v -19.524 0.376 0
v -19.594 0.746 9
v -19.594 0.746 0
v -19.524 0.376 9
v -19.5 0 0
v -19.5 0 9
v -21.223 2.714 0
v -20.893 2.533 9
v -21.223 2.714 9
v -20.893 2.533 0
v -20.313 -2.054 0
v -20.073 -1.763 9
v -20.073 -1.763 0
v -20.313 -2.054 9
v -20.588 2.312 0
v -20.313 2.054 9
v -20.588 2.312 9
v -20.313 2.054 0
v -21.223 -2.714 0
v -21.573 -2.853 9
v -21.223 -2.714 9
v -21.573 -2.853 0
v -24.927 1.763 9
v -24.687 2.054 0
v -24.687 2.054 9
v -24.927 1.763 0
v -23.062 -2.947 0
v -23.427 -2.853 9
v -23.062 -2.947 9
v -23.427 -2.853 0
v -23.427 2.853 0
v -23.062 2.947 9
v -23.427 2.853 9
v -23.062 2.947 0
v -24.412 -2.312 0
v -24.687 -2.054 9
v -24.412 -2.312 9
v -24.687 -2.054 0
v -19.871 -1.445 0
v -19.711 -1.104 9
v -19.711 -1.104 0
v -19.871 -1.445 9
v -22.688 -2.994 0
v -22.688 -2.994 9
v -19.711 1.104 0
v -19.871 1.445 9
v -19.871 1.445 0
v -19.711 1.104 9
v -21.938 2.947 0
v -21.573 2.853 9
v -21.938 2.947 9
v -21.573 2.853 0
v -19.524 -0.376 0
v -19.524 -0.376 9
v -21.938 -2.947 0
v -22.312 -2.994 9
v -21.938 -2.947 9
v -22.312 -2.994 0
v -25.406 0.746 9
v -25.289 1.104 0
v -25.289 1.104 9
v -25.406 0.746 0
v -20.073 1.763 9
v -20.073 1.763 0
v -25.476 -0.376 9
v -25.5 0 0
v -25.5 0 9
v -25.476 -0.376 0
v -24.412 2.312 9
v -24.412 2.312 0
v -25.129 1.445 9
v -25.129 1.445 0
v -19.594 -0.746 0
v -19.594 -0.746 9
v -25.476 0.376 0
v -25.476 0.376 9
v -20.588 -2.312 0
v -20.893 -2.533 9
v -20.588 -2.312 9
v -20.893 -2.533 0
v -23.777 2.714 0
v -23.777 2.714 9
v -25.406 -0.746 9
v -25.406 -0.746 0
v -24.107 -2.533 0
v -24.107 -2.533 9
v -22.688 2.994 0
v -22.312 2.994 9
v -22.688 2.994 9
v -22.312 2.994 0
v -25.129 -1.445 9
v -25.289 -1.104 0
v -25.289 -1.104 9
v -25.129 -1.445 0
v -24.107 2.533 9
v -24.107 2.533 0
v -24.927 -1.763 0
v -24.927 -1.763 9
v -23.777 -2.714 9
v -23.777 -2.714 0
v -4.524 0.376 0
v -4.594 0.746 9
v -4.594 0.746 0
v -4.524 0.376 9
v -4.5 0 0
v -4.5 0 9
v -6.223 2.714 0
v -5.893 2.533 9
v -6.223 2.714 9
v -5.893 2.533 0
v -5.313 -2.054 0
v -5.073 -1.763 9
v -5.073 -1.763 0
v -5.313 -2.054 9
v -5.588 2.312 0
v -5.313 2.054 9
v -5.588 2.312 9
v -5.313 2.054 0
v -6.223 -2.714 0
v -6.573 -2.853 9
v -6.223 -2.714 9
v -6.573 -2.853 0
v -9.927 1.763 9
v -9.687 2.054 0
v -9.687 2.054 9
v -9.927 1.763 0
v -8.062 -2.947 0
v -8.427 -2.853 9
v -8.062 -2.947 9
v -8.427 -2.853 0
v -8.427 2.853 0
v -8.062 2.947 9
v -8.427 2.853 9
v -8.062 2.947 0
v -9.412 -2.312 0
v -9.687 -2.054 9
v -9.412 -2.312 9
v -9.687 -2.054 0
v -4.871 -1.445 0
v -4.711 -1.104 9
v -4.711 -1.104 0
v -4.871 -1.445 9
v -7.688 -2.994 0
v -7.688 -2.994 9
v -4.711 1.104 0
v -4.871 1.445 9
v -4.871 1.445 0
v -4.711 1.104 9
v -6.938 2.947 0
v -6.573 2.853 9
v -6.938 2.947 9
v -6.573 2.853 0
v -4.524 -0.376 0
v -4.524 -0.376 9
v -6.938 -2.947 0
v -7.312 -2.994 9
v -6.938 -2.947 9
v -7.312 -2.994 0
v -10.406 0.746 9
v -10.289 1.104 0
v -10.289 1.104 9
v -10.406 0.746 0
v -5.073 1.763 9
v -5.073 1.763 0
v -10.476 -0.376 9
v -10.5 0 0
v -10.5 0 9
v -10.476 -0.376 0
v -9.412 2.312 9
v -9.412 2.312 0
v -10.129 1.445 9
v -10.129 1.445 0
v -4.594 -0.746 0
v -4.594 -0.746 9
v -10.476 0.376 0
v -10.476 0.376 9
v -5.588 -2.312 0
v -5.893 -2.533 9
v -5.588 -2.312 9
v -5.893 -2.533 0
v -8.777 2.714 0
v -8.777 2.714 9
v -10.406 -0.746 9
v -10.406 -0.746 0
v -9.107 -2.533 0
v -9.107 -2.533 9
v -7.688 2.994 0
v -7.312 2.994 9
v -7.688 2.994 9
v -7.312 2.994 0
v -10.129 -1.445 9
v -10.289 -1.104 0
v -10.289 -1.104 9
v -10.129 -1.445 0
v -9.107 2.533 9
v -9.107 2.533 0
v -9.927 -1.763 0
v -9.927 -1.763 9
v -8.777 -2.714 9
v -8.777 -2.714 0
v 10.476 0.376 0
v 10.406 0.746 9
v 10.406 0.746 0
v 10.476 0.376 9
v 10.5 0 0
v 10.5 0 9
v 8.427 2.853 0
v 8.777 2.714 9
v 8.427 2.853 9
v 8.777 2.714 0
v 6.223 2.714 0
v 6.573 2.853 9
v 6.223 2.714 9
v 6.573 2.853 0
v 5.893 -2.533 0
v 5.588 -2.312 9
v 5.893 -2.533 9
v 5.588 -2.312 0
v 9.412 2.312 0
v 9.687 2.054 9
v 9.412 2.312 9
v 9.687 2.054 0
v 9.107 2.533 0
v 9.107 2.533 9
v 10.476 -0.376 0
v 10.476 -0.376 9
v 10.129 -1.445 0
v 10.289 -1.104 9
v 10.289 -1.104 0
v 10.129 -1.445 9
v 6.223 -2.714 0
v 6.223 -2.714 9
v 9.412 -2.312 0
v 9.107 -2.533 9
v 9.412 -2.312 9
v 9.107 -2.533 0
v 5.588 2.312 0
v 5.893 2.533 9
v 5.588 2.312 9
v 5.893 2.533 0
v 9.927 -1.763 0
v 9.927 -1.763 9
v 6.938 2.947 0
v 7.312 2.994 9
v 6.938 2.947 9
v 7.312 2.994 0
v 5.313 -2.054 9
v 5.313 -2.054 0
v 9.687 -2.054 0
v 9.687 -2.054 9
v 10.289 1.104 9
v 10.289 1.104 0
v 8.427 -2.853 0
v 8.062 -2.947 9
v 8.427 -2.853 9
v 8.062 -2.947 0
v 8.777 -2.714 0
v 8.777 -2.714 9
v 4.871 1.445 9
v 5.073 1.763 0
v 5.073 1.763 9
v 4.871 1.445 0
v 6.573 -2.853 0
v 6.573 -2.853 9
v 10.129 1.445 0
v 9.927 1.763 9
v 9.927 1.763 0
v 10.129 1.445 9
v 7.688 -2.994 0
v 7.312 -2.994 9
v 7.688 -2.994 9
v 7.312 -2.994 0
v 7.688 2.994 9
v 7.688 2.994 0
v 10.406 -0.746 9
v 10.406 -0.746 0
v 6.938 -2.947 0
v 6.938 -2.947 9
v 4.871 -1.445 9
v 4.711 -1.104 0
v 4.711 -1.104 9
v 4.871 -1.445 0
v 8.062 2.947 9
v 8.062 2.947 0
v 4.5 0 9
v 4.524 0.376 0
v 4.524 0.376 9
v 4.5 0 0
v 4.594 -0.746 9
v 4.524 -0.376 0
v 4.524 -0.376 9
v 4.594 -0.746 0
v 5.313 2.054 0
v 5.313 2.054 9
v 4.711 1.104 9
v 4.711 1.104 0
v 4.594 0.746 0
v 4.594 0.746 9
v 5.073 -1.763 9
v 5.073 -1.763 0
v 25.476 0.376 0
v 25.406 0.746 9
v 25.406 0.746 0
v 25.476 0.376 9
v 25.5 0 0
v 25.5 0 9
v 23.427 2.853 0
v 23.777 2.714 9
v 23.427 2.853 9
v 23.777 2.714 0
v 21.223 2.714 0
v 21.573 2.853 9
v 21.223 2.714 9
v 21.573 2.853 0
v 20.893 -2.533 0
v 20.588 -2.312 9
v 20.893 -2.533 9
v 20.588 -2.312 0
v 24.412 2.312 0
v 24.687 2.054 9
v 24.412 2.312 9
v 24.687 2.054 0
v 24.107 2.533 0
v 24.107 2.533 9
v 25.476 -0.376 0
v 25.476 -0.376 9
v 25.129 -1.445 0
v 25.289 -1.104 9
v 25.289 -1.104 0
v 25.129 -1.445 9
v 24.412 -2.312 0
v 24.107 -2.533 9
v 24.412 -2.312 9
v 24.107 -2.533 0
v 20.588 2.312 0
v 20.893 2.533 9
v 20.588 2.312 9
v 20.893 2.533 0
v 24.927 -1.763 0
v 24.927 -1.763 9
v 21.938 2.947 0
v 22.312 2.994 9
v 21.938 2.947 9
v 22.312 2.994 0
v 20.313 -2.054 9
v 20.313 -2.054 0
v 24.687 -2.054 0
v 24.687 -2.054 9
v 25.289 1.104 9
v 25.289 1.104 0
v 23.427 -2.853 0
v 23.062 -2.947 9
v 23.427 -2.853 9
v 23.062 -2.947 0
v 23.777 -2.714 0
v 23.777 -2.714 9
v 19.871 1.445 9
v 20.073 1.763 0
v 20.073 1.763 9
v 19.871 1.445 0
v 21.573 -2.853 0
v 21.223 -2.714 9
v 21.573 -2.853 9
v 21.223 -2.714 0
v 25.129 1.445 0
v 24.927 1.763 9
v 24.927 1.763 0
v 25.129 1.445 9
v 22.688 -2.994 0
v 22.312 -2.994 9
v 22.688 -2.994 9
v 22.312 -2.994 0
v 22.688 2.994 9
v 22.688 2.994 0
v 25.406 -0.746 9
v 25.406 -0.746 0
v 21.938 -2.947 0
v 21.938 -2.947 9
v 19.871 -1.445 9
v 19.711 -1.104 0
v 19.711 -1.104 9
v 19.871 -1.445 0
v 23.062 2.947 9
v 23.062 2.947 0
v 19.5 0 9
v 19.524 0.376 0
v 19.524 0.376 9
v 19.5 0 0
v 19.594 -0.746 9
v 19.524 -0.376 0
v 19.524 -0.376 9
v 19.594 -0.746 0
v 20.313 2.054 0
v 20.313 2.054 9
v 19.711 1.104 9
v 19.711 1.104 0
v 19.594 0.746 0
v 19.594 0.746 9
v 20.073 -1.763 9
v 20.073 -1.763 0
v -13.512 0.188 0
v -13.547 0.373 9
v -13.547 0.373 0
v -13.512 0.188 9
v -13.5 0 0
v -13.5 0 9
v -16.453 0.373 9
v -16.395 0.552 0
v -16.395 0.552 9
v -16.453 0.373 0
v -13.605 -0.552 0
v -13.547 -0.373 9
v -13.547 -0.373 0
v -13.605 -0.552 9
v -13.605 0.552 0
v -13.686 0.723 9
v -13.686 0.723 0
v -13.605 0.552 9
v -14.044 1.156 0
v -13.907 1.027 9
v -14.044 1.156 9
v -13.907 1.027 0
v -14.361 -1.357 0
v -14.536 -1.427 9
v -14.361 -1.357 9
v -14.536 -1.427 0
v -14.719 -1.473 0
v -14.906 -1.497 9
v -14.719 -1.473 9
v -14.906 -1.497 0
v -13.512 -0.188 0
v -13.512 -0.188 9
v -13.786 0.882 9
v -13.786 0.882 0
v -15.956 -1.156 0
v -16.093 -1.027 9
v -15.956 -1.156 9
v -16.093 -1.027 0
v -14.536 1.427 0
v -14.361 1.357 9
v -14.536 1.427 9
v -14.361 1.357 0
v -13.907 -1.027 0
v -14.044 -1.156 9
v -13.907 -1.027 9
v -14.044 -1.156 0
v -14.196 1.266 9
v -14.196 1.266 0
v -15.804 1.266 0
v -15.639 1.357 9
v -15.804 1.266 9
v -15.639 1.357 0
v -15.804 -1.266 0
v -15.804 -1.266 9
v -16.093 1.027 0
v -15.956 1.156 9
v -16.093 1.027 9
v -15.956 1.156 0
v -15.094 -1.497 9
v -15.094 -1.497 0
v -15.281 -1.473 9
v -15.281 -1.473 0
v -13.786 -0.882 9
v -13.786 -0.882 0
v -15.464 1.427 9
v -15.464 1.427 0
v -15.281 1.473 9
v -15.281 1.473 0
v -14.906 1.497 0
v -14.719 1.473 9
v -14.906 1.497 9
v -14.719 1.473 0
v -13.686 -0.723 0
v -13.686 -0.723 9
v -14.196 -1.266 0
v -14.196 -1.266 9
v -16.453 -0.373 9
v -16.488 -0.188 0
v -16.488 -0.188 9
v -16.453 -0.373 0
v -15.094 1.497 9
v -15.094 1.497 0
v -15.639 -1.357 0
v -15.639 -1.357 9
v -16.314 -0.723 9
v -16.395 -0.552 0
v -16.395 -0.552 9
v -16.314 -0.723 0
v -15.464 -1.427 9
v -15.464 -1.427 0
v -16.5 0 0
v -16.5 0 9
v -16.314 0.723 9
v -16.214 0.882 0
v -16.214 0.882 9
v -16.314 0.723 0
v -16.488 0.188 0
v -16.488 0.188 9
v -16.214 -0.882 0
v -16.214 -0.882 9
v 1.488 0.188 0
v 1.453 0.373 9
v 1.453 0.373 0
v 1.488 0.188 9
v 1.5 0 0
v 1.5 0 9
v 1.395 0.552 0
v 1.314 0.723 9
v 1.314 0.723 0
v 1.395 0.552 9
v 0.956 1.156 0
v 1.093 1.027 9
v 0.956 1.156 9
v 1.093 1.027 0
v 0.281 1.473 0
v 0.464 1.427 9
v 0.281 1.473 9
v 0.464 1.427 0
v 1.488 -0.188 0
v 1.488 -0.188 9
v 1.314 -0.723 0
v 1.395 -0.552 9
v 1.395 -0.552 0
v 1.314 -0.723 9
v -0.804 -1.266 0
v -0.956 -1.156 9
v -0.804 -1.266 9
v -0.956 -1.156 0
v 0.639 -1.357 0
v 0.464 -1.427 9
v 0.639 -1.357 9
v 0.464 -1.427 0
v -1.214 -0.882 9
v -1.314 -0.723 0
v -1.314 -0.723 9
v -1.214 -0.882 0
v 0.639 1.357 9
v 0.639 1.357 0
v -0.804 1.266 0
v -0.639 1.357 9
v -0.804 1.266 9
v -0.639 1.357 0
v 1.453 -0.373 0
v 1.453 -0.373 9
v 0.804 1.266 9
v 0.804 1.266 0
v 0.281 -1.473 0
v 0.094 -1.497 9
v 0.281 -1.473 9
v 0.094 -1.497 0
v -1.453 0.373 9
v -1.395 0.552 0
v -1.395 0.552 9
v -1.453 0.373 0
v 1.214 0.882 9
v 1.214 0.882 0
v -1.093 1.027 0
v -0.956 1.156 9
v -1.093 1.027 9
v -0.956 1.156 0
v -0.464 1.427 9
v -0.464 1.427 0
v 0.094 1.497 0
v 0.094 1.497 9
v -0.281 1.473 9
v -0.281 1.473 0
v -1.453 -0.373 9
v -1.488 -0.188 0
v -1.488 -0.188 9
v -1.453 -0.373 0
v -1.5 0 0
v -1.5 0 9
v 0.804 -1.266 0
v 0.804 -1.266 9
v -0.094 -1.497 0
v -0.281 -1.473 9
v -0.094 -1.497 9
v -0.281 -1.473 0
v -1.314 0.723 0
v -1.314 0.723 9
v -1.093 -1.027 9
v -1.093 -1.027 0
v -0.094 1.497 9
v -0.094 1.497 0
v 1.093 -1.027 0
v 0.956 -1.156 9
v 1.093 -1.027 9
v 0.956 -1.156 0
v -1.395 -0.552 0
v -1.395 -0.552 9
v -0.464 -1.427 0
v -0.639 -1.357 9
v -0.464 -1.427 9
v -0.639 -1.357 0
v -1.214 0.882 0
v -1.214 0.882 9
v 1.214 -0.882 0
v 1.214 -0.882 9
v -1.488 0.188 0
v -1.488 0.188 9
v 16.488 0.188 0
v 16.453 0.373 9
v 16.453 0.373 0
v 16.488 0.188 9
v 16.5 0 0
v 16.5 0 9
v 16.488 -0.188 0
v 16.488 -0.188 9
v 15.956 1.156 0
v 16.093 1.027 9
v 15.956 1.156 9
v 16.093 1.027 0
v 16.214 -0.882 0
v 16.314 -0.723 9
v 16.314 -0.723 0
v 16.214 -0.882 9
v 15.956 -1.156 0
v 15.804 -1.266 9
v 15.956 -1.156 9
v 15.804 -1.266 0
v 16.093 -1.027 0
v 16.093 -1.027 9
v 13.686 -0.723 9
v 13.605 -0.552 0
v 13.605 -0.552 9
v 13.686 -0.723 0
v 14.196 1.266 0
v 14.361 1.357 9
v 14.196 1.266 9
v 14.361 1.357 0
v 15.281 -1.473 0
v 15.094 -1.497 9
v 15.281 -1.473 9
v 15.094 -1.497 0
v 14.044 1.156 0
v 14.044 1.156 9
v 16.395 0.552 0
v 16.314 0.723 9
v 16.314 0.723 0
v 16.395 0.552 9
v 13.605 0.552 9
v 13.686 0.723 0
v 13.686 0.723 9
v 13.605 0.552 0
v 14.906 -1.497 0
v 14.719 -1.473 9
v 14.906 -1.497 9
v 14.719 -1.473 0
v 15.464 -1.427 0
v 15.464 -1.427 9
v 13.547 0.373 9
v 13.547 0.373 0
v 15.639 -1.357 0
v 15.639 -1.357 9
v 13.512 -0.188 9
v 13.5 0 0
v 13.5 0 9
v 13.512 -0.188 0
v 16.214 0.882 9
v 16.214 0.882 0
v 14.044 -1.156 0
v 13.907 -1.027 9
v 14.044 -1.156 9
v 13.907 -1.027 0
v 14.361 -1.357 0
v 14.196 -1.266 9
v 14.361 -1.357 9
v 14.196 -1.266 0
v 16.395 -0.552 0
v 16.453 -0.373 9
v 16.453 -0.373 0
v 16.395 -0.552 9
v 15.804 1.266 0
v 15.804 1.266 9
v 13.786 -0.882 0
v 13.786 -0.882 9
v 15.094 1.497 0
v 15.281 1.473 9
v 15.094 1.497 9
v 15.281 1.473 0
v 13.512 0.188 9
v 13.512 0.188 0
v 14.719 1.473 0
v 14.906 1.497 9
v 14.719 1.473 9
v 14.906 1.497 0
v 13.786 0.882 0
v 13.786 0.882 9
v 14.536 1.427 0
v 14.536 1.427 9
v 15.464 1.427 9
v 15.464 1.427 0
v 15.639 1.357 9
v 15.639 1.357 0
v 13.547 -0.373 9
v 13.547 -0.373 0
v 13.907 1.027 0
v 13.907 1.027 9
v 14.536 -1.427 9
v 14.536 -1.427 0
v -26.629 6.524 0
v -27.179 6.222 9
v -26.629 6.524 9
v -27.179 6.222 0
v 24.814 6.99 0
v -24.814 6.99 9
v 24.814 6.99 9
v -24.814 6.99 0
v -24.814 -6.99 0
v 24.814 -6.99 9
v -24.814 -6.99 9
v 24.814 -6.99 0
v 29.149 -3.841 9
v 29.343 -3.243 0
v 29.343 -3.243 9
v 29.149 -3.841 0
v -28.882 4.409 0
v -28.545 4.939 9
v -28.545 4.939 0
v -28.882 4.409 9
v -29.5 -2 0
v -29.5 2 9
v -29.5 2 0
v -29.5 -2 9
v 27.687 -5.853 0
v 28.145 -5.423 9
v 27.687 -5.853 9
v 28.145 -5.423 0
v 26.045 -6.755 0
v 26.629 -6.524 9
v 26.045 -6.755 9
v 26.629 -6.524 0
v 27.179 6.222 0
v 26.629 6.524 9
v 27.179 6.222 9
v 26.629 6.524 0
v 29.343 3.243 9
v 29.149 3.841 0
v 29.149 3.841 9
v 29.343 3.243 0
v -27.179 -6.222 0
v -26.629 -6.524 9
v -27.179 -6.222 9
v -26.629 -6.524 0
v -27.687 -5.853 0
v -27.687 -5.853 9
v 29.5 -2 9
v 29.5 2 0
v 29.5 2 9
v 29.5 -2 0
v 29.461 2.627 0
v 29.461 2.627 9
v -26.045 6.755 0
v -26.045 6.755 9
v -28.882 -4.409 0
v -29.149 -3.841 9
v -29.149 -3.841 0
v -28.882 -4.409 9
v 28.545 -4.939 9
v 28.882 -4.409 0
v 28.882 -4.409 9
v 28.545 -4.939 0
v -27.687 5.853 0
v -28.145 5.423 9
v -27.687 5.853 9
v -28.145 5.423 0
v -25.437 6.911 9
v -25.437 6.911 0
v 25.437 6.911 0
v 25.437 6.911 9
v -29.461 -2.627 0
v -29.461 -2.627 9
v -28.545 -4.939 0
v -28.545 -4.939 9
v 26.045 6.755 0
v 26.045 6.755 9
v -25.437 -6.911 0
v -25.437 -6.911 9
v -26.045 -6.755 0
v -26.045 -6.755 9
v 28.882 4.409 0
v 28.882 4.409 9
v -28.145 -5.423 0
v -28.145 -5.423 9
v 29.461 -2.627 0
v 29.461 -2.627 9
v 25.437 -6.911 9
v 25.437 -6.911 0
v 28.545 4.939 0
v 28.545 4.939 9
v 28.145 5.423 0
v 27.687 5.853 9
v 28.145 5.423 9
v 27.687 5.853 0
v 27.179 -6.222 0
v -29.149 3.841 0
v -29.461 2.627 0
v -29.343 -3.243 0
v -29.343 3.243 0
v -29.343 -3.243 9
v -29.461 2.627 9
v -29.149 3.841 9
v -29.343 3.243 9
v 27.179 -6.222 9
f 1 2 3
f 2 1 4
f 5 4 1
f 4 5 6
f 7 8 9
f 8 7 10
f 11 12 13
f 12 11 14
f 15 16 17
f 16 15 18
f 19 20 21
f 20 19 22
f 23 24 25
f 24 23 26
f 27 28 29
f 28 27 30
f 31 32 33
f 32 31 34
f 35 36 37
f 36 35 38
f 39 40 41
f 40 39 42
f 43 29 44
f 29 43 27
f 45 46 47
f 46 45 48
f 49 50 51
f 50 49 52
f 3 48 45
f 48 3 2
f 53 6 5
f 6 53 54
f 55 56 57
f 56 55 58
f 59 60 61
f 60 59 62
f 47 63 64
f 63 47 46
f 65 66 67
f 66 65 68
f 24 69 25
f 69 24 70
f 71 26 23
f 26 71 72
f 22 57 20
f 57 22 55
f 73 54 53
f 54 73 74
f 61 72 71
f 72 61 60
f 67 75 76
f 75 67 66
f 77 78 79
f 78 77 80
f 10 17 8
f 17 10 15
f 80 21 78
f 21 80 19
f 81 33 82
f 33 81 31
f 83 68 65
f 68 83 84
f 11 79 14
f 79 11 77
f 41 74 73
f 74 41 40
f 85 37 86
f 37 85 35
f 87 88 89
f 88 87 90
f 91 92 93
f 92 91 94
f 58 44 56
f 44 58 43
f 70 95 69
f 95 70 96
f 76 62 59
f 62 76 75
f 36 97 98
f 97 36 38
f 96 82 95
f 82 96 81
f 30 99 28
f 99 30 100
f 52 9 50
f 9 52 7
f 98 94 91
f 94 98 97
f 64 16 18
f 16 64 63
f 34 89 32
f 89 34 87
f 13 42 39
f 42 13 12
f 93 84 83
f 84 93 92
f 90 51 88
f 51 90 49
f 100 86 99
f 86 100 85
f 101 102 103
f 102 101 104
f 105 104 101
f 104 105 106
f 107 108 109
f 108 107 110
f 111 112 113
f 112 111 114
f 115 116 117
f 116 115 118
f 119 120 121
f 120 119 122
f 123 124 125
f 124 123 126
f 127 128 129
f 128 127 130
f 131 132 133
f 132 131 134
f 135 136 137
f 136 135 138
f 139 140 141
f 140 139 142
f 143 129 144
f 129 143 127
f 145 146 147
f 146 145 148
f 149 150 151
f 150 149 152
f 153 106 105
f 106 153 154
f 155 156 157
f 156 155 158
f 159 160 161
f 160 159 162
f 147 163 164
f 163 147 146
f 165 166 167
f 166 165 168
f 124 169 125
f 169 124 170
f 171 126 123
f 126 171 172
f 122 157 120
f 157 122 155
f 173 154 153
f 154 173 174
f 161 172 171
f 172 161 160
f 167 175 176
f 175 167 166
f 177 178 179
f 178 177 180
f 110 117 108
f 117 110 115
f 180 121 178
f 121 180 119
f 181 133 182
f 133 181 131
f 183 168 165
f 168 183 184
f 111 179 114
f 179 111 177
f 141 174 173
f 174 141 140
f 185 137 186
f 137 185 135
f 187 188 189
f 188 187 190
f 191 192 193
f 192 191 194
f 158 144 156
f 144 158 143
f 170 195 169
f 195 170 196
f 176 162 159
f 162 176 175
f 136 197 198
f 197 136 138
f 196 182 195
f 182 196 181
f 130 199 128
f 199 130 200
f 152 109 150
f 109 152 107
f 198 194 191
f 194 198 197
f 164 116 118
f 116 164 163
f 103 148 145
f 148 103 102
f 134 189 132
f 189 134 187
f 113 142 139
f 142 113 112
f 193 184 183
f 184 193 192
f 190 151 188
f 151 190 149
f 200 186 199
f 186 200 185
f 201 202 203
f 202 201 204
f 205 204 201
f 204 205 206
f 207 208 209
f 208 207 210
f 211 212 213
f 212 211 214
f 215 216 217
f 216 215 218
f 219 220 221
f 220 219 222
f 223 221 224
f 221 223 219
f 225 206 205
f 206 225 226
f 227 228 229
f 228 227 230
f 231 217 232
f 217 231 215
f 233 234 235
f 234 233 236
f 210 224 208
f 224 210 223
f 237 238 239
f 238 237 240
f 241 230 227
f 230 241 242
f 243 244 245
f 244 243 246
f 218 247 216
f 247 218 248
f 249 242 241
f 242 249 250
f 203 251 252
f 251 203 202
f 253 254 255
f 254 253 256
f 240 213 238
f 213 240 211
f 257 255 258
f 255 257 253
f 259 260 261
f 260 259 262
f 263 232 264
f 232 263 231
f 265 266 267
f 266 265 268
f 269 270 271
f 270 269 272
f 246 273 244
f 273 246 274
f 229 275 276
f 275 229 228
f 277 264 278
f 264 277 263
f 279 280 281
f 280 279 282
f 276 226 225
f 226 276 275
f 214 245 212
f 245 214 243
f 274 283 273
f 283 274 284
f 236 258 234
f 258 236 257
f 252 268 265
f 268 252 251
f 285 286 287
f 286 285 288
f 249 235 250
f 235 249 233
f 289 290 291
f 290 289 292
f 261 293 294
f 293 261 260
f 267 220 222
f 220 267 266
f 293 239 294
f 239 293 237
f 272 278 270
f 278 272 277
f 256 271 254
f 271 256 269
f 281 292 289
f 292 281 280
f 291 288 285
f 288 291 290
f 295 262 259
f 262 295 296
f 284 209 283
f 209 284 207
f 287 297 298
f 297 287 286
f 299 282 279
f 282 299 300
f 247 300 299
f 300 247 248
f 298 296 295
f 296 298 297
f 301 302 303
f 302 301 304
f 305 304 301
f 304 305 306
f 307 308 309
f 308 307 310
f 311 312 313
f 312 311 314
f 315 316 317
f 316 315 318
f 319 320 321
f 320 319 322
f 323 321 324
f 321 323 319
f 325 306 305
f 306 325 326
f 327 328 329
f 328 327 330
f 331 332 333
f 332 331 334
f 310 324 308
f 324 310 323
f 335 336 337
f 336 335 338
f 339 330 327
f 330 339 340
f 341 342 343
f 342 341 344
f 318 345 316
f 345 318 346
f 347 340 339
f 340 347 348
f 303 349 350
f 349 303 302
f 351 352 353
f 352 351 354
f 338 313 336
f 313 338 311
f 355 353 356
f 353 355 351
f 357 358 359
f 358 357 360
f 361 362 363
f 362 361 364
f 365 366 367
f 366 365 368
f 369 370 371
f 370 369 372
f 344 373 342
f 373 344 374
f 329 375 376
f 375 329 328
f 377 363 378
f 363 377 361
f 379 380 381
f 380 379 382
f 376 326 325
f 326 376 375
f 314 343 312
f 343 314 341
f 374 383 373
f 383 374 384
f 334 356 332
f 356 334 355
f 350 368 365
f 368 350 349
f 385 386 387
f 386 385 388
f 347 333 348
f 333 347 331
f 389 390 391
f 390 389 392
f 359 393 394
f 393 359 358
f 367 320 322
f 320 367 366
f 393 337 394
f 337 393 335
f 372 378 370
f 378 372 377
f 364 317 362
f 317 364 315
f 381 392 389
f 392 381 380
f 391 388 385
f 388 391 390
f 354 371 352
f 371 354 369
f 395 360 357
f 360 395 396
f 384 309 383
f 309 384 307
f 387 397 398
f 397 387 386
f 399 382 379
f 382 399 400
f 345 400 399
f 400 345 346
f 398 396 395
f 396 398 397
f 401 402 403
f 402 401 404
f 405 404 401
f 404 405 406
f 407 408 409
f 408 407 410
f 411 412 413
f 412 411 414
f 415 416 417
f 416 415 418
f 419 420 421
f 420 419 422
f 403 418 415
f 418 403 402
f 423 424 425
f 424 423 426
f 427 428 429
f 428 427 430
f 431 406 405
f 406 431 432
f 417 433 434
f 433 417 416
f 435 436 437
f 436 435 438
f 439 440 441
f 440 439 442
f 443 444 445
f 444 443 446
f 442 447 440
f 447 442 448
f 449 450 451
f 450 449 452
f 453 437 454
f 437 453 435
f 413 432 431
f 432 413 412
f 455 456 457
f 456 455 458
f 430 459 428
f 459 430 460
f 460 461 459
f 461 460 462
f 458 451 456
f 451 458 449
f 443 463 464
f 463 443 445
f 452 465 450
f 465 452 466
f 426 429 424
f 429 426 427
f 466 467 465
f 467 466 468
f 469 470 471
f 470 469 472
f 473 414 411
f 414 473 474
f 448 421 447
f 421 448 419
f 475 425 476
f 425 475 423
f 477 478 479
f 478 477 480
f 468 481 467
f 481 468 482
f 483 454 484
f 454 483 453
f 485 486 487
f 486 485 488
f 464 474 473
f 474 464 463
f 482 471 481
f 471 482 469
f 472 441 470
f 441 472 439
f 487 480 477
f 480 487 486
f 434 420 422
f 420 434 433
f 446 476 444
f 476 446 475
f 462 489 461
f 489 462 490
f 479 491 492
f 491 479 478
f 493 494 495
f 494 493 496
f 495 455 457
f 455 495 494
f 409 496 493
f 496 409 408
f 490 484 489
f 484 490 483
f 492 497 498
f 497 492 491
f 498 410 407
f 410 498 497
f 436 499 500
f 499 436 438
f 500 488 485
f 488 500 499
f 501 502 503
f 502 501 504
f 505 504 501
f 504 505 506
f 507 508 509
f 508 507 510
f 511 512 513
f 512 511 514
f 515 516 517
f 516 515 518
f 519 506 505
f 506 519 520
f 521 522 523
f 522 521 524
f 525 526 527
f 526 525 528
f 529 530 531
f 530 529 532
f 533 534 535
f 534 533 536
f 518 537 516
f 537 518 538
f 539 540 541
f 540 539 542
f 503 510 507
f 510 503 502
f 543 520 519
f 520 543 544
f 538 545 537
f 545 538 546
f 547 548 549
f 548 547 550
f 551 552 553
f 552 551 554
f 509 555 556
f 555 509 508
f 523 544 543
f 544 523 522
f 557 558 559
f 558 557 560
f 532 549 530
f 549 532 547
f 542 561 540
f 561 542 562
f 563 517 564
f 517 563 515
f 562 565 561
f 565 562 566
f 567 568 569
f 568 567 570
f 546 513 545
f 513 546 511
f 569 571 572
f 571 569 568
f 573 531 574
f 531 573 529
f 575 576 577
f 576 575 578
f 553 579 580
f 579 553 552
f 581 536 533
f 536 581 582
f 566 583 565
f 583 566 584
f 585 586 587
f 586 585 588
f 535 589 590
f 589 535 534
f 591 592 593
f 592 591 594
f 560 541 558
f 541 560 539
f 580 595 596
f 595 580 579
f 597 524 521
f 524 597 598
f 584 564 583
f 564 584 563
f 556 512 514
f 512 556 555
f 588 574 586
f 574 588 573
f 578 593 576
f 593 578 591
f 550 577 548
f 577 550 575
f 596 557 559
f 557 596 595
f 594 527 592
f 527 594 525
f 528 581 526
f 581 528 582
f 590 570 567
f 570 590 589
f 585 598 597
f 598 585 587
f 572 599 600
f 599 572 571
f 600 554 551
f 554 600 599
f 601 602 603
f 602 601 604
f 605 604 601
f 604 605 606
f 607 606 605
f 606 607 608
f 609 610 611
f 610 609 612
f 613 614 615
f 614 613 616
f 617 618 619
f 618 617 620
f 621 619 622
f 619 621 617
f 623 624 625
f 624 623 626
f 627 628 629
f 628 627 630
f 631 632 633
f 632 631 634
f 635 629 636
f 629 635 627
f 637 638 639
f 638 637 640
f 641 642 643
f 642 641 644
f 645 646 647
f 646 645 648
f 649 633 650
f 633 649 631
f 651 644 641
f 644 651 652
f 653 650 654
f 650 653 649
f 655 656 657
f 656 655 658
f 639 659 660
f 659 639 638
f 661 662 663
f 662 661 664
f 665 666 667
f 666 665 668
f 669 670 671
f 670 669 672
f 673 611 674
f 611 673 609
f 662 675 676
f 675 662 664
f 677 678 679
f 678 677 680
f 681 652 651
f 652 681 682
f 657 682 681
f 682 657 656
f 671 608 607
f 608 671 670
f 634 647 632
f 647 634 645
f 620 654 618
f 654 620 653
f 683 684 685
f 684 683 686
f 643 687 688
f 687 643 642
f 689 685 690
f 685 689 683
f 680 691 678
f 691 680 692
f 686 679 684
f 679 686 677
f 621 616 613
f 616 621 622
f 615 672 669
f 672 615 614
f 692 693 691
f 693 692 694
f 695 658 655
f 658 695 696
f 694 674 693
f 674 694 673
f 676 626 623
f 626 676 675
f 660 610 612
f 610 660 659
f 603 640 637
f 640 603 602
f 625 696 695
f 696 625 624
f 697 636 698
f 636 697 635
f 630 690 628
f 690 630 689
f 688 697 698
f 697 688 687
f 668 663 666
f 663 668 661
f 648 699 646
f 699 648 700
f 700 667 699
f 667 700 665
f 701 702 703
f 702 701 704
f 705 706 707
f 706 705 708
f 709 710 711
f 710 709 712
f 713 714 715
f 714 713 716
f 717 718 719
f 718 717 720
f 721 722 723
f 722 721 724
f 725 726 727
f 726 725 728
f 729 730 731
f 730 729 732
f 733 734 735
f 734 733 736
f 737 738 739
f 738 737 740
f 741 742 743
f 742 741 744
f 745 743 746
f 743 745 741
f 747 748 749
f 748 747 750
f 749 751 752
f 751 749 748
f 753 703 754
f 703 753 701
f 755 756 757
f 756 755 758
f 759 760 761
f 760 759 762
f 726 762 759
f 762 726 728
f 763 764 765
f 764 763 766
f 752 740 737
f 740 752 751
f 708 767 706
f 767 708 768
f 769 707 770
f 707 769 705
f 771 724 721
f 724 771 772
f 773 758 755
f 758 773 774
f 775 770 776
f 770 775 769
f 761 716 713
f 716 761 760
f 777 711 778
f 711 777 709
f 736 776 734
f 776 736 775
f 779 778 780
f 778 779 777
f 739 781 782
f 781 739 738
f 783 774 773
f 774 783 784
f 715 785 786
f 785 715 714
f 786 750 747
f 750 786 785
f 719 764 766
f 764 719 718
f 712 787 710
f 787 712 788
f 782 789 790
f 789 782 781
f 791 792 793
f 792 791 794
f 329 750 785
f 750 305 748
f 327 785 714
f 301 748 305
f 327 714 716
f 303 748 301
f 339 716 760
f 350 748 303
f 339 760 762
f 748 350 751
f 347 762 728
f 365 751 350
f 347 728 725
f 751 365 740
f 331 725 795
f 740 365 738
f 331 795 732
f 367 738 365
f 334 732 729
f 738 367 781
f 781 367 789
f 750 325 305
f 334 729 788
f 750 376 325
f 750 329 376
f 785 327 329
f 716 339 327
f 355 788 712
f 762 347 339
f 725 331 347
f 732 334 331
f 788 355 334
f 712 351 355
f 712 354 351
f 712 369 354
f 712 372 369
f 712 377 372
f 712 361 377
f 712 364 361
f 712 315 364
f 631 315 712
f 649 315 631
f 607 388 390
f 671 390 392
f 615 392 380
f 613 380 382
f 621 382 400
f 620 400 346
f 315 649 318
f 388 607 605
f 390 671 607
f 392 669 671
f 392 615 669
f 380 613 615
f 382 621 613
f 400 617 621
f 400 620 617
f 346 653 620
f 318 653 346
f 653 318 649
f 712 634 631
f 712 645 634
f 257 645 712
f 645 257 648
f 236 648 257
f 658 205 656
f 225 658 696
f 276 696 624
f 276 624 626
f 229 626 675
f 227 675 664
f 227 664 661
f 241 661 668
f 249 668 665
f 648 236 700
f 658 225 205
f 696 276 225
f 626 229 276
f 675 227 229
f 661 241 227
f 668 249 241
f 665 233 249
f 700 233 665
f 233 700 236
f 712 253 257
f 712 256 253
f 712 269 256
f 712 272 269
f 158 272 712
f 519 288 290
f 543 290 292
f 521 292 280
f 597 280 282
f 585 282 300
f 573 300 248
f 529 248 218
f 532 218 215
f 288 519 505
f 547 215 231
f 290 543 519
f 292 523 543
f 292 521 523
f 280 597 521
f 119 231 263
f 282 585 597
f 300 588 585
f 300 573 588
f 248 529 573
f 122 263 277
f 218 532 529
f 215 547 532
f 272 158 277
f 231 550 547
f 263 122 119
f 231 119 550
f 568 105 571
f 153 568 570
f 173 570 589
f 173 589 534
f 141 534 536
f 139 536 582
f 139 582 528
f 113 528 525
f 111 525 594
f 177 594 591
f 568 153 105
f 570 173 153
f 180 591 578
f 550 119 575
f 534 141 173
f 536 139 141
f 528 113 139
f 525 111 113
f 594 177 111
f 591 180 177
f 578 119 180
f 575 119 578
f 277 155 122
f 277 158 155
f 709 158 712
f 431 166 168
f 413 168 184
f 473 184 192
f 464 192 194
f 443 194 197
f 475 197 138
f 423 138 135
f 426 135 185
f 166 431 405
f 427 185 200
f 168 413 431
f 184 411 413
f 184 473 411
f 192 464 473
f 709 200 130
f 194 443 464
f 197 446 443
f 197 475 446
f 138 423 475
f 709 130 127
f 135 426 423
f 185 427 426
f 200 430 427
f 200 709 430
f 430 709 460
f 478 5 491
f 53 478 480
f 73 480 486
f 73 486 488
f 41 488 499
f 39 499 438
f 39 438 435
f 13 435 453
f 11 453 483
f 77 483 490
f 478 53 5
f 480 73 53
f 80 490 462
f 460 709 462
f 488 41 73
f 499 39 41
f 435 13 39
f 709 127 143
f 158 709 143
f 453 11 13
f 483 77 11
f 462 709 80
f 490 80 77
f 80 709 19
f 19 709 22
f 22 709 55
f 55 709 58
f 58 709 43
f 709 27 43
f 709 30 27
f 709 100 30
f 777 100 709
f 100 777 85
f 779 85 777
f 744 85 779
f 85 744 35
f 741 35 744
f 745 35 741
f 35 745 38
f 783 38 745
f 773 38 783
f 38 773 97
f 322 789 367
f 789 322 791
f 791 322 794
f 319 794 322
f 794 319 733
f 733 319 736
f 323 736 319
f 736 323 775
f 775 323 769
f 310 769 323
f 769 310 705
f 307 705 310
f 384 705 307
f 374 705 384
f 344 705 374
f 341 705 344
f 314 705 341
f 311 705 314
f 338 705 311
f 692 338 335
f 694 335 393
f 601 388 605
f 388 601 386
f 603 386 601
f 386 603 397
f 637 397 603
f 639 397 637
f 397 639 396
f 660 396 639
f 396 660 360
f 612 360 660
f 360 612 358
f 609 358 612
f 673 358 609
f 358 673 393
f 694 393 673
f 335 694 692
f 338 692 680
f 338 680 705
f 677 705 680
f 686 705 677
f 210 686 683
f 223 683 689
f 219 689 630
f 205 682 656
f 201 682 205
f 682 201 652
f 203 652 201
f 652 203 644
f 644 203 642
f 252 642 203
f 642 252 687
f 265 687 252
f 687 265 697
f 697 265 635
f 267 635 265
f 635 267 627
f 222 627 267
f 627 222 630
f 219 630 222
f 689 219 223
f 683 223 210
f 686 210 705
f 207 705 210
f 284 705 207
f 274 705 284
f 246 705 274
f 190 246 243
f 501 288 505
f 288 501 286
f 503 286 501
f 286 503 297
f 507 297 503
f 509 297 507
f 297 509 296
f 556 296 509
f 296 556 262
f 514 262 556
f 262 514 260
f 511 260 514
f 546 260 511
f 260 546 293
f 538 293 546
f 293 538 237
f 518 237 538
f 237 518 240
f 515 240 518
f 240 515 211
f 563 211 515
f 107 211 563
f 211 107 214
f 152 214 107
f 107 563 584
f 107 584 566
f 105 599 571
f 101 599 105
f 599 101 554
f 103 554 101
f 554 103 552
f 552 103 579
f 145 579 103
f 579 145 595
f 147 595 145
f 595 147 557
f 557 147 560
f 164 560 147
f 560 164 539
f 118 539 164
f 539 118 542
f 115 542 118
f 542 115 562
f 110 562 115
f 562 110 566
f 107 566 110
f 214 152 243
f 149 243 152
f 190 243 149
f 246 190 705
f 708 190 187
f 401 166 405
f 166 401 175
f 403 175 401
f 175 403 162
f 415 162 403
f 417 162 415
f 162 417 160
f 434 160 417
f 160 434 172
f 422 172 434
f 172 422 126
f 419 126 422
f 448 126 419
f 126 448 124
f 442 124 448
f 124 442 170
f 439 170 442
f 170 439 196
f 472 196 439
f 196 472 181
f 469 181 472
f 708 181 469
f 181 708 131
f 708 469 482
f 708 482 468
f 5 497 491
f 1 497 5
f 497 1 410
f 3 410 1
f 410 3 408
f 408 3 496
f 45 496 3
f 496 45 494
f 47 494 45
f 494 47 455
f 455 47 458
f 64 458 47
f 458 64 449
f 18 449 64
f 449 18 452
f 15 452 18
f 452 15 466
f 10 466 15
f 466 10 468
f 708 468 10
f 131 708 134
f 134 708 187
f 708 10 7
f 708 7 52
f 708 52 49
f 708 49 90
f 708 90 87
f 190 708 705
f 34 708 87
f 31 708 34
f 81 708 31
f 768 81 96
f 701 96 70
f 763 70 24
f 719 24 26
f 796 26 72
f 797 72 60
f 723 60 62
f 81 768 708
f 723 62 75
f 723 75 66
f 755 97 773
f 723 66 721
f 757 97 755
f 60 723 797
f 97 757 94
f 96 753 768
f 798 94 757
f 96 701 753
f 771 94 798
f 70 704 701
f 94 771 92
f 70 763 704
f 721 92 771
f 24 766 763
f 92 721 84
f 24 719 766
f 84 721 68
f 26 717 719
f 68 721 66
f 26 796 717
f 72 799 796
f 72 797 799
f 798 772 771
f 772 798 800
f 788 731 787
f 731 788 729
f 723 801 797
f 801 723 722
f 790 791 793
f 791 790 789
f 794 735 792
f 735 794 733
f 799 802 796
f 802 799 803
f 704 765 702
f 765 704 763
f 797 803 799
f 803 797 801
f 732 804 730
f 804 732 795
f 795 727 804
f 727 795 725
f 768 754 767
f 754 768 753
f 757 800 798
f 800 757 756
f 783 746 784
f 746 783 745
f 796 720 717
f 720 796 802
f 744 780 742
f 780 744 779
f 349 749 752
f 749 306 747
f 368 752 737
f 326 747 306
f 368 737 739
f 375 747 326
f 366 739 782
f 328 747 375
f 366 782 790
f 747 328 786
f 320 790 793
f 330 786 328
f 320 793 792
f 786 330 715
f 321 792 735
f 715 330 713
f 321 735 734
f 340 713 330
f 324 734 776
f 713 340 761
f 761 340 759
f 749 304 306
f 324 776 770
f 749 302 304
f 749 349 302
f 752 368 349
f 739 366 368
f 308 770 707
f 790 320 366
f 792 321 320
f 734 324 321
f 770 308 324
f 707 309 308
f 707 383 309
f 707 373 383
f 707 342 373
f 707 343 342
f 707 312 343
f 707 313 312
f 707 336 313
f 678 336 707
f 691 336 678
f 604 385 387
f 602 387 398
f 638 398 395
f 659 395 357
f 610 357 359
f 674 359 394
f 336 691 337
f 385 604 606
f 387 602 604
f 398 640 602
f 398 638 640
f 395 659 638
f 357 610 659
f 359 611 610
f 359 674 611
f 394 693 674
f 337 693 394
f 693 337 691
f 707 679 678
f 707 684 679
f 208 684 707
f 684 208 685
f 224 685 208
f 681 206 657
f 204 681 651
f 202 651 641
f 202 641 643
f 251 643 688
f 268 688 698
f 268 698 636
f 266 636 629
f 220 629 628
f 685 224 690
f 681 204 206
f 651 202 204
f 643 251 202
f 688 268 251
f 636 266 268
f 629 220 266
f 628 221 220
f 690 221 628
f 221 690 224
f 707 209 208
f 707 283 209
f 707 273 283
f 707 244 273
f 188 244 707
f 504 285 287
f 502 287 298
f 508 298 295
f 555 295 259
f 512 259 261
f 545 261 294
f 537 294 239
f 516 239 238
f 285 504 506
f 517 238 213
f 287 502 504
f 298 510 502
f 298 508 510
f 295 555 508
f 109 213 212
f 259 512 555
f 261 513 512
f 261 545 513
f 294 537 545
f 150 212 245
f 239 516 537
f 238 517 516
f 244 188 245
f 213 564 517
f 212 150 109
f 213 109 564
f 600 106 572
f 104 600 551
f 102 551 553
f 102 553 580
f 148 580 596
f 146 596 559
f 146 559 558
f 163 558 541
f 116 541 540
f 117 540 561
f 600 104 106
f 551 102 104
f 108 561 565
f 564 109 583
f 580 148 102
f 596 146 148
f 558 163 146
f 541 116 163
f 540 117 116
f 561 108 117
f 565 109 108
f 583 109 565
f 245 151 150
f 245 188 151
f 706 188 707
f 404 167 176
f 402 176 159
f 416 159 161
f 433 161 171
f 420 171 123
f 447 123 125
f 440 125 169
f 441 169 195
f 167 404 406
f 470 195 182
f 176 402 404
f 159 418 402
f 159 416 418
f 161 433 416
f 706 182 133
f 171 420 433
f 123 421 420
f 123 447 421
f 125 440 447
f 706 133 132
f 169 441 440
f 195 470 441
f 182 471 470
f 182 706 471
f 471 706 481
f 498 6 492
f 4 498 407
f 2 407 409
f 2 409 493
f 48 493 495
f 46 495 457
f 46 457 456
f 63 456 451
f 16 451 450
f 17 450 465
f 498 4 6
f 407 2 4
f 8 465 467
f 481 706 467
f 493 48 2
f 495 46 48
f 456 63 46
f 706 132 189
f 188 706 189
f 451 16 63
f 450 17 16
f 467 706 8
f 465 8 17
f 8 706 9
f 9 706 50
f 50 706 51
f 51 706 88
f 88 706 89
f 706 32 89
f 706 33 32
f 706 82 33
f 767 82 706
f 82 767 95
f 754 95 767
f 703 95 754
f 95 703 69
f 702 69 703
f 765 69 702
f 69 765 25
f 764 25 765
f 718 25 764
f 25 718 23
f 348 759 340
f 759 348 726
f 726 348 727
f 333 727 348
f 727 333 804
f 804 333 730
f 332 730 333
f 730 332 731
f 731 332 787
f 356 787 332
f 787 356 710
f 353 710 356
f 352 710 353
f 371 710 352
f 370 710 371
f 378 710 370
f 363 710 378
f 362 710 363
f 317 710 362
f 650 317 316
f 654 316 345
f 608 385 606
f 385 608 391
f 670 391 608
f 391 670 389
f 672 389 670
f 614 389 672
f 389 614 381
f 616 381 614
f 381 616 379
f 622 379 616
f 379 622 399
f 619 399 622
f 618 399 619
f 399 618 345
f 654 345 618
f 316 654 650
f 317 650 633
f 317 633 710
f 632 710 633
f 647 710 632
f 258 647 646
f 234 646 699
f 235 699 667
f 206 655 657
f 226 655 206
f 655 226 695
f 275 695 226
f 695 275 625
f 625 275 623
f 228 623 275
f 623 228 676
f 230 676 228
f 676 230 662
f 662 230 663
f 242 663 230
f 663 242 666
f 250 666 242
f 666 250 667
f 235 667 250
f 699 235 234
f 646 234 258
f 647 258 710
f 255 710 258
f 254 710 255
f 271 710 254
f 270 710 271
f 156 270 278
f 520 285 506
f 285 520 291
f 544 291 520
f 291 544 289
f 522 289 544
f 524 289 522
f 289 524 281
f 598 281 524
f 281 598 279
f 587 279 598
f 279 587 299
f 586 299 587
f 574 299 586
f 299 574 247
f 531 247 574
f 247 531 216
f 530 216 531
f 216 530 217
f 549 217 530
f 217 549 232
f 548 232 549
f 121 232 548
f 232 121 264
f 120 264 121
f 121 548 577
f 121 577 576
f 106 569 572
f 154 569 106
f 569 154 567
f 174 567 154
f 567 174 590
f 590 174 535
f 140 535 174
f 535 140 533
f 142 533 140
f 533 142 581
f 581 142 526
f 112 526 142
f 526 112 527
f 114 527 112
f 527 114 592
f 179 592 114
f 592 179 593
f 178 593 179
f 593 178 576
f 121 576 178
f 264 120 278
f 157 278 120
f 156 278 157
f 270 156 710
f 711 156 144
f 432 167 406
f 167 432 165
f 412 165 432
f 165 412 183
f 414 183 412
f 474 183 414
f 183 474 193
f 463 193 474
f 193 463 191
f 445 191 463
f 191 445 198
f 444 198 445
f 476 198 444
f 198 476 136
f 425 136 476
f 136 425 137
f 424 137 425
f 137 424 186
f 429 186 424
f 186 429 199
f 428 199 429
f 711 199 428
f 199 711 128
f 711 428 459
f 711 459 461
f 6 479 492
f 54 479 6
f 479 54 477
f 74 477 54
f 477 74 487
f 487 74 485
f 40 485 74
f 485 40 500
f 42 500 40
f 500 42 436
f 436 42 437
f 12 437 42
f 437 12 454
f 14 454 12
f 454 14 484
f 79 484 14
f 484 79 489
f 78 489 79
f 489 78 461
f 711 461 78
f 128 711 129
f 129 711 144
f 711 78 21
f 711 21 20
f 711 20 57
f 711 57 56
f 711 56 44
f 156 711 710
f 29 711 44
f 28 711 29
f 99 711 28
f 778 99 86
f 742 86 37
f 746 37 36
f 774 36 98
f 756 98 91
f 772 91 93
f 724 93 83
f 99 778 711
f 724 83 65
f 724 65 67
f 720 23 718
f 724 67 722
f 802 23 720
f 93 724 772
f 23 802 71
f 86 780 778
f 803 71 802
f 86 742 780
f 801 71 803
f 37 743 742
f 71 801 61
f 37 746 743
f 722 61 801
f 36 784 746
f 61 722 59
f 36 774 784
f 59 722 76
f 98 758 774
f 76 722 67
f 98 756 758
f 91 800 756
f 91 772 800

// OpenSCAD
$fn = 50;


difference() {
	union() {
		*color(alpha = 1.0000000000, c = "gray") {
			translate(v = [0, 7, 0]) {
				linear_extrude(height = 1) {
					text(font = "Arial:style=Bold", halign = "center", size = 4.5000000000, text = "COMMENT plate main", valign = "center");
				}
			}
		}
		hull() {
			translate(v = [-24.5000000000, 2.0000000000, 0]) {
				cylinder(h = 9, r = 5);
			}
			translate(v = [24.5000000000, 2.0000000000, 0]) {
				cylinder(h = 9, r = 5);
			}
			translate(v = [-24.5000000000, -2.0000000000, 0]) {
				cylinder(h = 9, r = 5);
			}
			translate(v = [24.5000000000, -2.0000000000, 0]) {
				cylinder(h = 9, r = 5);
			}
		}
	}
	union() {
		*color(alpha = 1.0000000000, c = "gray") {
			translate(v = [0, 7, 0]) {
				linear_extrude(height = 1) {
					text(font = "Arial:style=Bold", halign = "center", size = 4.5000000000, text = "COMMENT holes main", valign = "center");
				}
			}
		}
		translate(v = [-22.5000000000, 0.0000000000, 0]) {
			translate(v = [0, 0, -100]) {
				cylinder(h = 200, r = 3.0000000000);
			}
		}
		translate(v = [-7.5000000000, 0.0000000000, 0]) {
			translate(v = [0, 0, -100]) {
				cylinder(h = 200, r = 3.0000000000);
			}
		}
		translate(v = [7.5000000000, 0.0000000000, 0]) {
			translate(v = [0, 0, -100]) {
				cylinder(h = 200, r = 3.0000000000);
			}
		}
		translate(v = [22.5000000000, 0.0000000000, 0]) {
			translate(v = [0, 0, -100]) {
				cylinder(h = 200, r = 3.0000000000);
			}
		}
		translate(v = [-22.5000000000, 0.0000000000, 0]) {
			translate(v = [0, 0, -100]) {
				cylinder(h = 200, r = 1.5000000000);
			}
		}
		translate(v = [-15.0000000000, 0.0000000000, 0]) {
			translate(v = [0, 0, -100]) {
				cylinder(h = 200, r = 1.5000000000);
			}
		}
		translate(v = [-7.5000000000, 0.0000000000, 0]) {
			translate(v = [0, 0, -100]) {
				cylinder(h = 200, r = 1.5000000000);
			}
		}
		translate(v = [0, 0, -100]) {
			cylinder(h = 200, r = 1.5000000000);
		}
		translate(v = [7.5000000000, 0.0000000000, 0]) {
			translate(v = [0, 0, -100]) {
				cylinder(h = 200, r = 1.5000000000);
			}
		}
		translate(v = [15.0000000000, 0.0000000000, 0]) {
			translate(v = [0, 0, -100]) {
				cylinder(h = 200, r = 1.5000000000);
			}
		}
		translate(v = [22.5000000000, 0.0000000000, 0]) {
			translate(v = [0, 0, -100]) {
				cylinder(h = 200, r = 1.5000000000);
			}
		}
	}
}
